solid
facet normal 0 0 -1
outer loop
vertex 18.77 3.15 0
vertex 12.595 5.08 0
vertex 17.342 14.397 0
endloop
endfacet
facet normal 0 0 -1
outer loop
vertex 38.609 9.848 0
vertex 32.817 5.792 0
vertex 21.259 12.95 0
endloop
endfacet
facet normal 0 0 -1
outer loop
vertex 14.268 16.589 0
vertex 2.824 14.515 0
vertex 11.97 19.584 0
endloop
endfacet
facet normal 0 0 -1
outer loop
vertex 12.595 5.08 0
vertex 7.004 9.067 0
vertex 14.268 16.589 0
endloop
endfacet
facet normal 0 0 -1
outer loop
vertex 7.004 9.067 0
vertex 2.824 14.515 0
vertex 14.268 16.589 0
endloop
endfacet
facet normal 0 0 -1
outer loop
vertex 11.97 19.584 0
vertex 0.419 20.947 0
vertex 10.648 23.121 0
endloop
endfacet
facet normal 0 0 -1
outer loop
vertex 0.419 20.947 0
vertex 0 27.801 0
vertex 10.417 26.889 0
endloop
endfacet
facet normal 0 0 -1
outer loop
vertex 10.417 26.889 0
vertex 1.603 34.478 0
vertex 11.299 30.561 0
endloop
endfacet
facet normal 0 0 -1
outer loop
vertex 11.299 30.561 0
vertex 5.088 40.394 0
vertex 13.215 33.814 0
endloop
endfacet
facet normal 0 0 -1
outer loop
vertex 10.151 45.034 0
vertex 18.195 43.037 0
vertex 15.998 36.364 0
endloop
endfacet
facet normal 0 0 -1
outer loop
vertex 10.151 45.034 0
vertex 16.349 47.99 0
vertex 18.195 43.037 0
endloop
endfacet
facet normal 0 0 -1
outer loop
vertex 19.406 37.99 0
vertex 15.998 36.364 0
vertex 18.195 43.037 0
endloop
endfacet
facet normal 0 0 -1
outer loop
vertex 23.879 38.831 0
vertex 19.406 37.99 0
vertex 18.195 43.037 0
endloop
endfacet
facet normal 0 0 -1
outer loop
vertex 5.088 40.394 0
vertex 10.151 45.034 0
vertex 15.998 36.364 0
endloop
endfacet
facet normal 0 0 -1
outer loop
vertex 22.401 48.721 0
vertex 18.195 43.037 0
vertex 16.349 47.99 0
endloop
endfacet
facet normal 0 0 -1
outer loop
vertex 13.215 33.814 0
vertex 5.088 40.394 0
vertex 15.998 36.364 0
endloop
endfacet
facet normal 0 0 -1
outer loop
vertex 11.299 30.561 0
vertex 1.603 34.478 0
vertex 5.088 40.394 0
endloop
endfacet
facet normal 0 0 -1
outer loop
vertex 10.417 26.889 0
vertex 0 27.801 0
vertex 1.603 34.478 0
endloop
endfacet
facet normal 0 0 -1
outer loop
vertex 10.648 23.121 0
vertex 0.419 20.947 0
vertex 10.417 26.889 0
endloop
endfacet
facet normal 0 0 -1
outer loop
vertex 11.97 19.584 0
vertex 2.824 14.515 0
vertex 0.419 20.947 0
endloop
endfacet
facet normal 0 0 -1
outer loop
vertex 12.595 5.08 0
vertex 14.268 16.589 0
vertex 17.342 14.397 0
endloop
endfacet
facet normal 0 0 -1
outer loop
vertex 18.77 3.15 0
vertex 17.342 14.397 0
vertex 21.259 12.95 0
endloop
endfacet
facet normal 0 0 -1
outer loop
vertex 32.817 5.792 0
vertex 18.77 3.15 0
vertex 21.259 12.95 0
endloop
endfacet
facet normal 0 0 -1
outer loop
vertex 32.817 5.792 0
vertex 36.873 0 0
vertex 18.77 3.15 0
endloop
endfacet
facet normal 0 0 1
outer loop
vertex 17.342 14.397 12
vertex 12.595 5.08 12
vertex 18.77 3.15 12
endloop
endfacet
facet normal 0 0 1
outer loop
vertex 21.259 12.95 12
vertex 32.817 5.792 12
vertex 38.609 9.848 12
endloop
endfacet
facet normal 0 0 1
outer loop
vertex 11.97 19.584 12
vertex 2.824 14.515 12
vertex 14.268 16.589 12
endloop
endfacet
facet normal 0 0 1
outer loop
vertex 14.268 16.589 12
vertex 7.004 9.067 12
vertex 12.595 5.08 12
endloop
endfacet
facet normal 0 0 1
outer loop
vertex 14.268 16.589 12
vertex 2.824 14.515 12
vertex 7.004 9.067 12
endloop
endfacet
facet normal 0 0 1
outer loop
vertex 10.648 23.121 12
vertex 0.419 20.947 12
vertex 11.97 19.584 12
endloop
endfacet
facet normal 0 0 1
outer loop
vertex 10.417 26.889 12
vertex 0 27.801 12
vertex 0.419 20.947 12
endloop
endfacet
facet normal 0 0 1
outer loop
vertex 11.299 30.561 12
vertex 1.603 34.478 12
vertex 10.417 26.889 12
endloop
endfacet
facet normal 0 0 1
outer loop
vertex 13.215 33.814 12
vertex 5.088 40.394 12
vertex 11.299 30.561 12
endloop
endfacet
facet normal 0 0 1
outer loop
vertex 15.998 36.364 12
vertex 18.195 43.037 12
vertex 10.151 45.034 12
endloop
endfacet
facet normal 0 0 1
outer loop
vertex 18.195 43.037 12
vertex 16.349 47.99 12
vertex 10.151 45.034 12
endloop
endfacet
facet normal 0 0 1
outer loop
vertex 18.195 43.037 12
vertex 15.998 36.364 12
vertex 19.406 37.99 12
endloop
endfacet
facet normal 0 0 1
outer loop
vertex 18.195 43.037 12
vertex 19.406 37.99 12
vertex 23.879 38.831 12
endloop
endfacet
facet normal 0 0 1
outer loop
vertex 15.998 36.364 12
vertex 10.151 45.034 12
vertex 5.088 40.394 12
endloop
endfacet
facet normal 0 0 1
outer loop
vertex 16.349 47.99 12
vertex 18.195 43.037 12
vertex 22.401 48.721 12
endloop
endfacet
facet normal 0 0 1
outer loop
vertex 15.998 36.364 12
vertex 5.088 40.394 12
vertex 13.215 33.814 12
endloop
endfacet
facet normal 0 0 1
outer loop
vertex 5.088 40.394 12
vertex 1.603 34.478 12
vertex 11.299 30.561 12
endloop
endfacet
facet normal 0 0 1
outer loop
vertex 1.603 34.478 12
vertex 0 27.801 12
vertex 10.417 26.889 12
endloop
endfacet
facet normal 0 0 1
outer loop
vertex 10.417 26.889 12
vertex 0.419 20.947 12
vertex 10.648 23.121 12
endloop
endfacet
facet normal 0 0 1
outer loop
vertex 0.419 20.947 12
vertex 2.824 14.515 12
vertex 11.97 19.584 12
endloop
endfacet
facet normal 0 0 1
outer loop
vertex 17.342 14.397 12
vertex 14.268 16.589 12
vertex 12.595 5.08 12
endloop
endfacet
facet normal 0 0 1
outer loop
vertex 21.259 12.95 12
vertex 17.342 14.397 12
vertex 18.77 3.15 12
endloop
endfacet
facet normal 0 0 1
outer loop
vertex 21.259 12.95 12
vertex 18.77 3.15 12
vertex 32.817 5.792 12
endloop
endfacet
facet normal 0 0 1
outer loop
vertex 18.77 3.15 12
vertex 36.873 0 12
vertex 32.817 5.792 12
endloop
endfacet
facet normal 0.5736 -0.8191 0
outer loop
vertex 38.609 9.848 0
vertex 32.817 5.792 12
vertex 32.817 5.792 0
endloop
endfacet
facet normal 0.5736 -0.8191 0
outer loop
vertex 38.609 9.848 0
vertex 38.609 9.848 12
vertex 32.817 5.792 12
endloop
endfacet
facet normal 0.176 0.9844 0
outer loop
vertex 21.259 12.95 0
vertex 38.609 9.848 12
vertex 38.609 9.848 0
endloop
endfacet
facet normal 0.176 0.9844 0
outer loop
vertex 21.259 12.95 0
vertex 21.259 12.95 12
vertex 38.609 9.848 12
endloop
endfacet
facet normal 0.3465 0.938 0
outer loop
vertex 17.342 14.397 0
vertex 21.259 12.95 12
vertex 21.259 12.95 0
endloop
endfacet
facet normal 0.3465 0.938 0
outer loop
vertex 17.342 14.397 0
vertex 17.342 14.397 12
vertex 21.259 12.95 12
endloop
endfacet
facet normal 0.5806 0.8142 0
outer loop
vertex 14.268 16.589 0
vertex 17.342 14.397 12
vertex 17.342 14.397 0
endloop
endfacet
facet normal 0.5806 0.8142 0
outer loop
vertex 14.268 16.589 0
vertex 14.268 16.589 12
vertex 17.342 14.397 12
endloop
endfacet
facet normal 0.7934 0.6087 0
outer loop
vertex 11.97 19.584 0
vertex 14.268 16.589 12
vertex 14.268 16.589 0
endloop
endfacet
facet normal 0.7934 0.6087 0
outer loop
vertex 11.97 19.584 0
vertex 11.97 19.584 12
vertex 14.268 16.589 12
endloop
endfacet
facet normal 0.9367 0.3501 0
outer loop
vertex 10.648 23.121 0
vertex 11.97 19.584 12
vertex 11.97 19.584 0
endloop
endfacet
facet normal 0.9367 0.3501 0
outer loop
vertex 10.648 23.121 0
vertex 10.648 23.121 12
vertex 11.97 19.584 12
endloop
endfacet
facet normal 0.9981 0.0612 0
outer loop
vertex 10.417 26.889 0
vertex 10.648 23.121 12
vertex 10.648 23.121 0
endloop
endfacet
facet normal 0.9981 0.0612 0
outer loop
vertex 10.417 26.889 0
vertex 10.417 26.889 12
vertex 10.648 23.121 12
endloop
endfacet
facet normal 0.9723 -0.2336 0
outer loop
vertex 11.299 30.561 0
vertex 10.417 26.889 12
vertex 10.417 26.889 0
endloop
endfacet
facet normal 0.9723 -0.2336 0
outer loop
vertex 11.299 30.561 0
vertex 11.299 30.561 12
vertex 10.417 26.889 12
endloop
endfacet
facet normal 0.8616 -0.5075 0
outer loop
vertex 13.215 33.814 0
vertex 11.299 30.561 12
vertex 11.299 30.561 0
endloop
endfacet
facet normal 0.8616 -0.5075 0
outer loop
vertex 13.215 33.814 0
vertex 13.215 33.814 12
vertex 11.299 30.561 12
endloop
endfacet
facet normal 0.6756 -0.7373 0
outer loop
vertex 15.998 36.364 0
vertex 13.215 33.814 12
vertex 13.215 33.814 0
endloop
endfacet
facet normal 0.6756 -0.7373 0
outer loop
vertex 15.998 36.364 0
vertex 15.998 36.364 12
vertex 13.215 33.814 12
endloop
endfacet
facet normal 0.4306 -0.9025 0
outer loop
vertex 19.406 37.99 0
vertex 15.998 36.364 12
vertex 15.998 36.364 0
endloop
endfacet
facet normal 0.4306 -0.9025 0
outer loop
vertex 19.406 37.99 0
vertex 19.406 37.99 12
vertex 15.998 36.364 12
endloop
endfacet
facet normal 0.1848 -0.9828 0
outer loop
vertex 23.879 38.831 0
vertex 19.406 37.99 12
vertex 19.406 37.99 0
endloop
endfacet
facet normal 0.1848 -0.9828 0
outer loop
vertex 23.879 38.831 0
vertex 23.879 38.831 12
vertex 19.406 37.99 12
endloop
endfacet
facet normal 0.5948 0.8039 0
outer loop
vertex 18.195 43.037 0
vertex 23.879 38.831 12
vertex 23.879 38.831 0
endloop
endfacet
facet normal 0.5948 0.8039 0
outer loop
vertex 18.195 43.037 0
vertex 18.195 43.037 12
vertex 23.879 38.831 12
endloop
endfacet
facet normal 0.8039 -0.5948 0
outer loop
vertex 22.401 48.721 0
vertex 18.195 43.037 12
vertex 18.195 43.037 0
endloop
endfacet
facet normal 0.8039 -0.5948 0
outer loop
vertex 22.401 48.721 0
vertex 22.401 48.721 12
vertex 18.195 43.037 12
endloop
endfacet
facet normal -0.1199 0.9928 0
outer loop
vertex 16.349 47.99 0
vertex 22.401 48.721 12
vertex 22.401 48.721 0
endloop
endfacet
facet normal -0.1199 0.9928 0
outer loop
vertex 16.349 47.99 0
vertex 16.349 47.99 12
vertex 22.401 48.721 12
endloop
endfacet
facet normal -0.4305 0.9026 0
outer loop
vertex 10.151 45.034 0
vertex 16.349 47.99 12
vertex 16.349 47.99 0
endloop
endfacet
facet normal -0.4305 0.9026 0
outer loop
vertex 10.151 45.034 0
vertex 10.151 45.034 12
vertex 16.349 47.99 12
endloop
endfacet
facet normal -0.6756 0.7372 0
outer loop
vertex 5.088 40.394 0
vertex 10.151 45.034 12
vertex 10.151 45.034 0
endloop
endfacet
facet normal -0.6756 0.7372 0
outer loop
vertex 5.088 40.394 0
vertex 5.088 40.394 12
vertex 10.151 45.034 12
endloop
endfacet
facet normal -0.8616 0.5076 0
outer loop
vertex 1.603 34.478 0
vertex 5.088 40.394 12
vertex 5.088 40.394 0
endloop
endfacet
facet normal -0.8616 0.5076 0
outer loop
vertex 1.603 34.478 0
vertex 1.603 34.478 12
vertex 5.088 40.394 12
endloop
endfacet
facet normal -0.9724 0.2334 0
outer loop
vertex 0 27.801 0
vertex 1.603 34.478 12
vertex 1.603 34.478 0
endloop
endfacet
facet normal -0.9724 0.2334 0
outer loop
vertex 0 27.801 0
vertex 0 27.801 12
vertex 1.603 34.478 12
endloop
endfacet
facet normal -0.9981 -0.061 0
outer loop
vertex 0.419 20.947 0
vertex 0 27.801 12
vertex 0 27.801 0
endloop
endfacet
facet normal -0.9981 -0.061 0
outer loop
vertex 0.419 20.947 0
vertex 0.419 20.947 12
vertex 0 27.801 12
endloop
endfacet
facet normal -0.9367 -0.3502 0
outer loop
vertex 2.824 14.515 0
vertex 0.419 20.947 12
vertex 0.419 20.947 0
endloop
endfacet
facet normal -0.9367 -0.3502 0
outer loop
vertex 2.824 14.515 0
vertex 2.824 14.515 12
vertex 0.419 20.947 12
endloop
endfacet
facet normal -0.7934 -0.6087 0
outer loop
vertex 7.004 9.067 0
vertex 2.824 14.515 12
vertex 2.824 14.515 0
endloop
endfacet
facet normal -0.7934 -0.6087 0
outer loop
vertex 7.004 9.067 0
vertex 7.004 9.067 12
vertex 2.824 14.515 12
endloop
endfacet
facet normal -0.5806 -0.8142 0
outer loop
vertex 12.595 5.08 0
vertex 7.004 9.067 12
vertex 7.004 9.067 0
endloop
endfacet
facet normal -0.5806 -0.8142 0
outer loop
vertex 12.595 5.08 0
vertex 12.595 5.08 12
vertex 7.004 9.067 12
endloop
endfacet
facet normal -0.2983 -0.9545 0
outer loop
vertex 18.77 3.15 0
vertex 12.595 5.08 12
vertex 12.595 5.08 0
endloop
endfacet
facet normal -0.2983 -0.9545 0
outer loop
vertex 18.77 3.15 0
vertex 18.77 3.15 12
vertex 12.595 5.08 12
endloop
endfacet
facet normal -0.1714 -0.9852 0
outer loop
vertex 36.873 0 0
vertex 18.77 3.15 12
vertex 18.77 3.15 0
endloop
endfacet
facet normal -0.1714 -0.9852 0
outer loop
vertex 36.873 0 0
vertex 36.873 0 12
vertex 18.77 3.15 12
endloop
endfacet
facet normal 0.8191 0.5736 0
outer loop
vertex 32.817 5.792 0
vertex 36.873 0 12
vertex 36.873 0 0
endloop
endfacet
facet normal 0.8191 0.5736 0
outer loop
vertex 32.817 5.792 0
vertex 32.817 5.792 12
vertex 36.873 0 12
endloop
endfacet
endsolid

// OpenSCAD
$fn = 32;

// ----------------------------------------------------------------------
// Hook plate: curl radius 18 mm over 170 degrees, 10 mm thick band
// ----------------------------------------------------------------------

// --- parameters (mm) ---
profile_height = 12;      // extrusion height
profile_points = 26;      // points of the closed outline

profile = [[18.195, 43.037], [22.401, 48.721], [16.349, 47.99], [10.151, 45.034], [5.088, 40.394], [1.603, 34.478], [0, 27.801], [0.419, 20.947], [2.824, 14.515], [7.004, 9.067], [12.595, 5.08], [18.77, 3.15], [36.873, 0], [32.817, 5.792], [38.609, 9.848], [21.259, 12.95], [17.342, 14.397], [14.268, 16.589], [11.97, 19.584], [10.648, 23.121], [10.417, 26.889], [11.299, 30.561], [13.215, 33.814], [15.998, 36.364], [19.406, 37.99], [23.879, 38.831]];  // single closed polygon, 26 points, counter clockwise

// --- the one profile operation ---
linear_extrude(height = profile_height) polygon(points = profile);
